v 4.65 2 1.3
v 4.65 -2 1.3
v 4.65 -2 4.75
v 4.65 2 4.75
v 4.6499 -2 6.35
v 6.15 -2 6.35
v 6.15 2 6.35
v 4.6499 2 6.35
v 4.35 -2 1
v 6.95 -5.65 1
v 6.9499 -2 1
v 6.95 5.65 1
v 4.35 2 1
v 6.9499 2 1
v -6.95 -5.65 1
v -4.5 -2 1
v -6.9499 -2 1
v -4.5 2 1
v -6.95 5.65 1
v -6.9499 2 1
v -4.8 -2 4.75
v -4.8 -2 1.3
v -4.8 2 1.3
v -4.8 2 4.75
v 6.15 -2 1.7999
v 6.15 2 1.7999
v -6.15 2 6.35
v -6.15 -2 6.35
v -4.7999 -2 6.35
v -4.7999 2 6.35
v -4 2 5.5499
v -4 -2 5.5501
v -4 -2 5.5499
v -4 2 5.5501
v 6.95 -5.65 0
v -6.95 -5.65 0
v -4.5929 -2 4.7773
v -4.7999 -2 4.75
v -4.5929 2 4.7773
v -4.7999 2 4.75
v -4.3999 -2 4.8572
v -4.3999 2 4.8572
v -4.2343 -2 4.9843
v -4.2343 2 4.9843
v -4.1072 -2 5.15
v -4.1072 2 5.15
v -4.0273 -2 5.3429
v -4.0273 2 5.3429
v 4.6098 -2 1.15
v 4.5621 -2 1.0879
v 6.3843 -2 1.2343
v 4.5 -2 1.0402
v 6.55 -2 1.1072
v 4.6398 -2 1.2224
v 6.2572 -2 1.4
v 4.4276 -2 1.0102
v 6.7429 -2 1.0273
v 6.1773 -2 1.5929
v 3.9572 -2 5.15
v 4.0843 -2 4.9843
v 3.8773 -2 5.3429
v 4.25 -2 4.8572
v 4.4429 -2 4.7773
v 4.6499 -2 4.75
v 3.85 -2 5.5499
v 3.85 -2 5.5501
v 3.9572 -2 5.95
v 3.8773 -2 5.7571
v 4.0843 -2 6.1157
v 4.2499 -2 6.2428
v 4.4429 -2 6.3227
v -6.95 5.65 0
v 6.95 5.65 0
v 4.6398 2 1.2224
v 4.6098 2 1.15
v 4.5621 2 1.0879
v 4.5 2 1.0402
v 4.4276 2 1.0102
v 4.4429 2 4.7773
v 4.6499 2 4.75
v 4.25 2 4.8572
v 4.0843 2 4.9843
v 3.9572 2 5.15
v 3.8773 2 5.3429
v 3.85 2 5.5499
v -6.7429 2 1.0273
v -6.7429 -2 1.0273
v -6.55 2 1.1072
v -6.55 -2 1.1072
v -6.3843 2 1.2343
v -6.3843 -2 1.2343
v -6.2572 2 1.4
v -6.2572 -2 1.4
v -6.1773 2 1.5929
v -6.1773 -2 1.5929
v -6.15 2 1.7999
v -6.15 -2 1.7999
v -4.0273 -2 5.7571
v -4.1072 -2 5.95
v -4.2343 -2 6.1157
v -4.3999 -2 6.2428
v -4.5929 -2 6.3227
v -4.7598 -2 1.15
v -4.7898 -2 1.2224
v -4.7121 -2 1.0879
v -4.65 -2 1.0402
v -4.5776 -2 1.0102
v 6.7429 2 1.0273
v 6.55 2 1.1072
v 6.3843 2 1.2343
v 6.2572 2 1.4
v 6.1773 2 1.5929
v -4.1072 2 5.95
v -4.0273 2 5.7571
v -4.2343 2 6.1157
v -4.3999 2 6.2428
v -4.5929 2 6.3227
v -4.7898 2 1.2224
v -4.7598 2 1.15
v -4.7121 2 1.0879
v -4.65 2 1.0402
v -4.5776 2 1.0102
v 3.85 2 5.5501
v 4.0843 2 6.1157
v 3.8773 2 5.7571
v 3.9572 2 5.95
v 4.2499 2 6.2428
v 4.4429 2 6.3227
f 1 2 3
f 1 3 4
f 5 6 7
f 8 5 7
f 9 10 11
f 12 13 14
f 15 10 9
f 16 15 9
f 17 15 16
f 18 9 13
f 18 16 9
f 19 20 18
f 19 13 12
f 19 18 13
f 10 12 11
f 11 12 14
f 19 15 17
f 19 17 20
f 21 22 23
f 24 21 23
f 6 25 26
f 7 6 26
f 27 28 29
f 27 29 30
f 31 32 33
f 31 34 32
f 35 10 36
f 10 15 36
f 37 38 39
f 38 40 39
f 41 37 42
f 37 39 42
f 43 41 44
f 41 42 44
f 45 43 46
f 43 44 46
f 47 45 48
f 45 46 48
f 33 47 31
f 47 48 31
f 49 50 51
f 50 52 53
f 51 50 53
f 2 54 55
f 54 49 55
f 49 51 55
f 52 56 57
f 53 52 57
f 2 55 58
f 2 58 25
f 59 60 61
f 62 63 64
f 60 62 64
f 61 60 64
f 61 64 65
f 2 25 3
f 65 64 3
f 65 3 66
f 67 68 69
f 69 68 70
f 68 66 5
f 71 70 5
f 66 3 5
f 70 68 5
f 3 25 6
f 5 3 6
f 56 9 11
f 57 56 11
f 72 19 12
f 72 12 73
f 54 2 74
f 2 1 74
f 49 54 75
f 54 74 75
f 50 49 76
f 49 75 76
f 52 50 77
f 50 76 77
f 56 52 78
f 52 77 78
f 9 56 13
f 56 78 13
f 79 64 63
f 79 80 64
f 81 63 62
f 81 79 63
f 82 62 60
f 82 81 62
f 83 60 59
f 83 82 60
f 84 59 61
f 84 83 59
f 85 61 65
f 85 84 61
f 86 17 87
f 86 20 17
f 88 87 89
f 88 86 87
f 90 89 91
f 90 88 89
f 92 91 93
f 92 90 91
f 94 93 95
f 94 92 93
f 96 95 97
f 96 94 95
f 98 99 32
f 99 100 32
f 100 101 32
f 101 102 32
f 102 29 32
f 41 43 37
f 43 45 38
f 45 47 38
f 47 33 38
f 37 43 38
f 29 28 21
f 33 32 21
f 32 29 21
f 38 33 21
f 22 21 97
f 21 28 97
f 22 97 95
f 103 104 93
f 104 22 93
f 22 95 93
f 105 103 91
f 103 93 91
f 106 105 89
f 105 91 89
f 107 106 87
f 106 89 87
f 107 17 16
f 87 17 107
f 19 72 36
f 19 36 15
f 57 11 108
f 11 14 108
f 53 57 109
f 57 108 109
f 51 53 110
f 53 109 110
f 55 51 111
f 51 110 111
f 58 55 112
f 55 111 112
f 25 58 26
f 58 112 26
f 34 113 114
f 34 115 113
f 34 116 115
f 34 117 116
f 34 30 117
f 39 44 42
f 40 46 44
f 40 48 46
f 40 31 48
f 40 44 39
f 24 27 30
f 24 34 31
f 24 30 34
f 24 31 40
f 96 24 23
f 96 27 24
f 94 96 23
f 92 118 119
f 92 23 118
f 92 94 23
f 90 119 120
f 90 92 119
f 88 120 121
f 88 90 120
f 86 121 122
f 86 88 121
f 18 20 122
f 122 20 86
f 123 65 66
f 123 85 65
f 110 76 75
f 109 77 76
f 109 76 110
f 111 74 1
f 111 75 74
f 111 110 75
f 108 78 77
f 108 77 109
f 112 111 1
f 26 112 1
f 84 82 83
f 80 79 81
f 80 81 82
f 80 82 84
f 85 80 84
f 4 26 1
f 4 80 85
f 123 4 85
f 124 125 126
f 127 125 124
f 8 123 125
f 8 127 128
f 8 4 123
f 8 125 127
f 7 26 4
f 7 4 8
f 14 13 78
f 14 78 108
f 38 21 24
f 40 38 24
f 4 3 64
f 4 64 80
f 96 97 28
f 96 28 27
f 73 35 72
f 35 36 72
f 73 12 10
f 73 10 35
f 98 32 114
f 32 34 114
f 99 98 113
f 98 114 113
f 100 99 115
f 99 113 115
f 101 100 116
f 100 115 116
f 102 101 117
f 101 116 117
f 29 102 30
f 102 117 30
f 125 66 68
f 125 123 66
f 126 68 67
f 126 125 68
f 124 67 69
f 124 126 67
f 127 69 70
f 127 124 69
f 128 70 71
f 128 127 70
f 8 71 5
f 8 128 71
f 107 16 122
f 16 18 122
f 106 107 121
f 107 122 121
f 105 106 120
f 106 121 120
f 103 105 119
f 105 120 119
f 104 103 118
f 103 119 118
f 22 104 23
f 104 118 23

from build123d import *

# Parameters (mm, degrees)
SKETCH_1_W      = 12.3
SKETCH_1_H      = 11.3
EXTRUDE_1_DEPTH = 1
SKETCH_2_W      = 1.35
SKETCH_2_H      = 4
SKETCH_2_W_2    = 1.5
EXTRUDE_2_DEPTH = 5.35
SKETCH_3_W      = 1.6
SKETCH_3_H      = 4
EXTRUDE_3_DEPTH = 0.8
SKETCH_4_W      = 1.6
SKETCH_4_H      = 4
EXTRUDE_4_DEPTH = 0.8
FILLET_1_R      = 0.8
FILLET_2_R      = 0.3
SKETCH_5_W      = 1
SKETCH_5_H      = 11.3
EXTRUDE_5_DEPTH = 0.8
SKETCH_6_W      = 1
SKETCH_6_H      = 11.3
EXTRUDE_6_DEPTH = 0.8
FILLET_3_R      = 0.8


with BuildPart() as part:
    # 스케치1 → 보스-돌출1 (new body)
    with BuildSketch(Plane.XY):
        Rectangle(SKETCH_1_W, SKETCH_1_H)
    extrude(amount=EXTRUDE_1_DEPTH)

    # 스케치2 → 보스-돌출2 (add)
    with BuildSketch(Plane.XY.offset(1)):
        with Locations((-5.475, 0)):
            Rectangle(SKETCH_2_W, SKETCH_2_H)
        with Locations((5.4, 0)):
            Rectangle(SKETCH_2_W_2, SKETCH_2_H)
    extrude(amount=EXTRUDE_2_DEPTH)

    # 스케치3 → 보스-돌출3 (add)
    with BuildSketch(Plane(origin=(-4.8, 0, 0), x_dir=(0, 0, -1), z_dir=(1, 0, 0))):
        with Locations((-5.55, 0)):
            Rectangle(SKETCH_3_W, SKETCH_3_H)
    extrude(amount=EXTRUDE_3_DEPTH)

    # 스케치4 → 보스-돌출4 (add)
    with BuildSketch(Plane.ZY.offset(-4.65)):
        with Locations((5.55, 0)):
            Rectangle(SKETCH_4_W, SKETCH_4_H)
    extrude(amount=EXTRUDE_4_DEPTH)

    # 필렛1
    fillet_1_edges = [part.edges().sort_by_distance(p)[0] for p in [
        (3.85, 0, 6.35),
        (3.85, 0, 4.75),
        (-4, 0, 6.35),
        (-4, 0, 4.75),
    ]]
    fillet(fillet_1_edges, radius=FILLET_1_R - 0.0001)  # a hair under: the kernel refuses the full size

    # 필렛2
    fillet_2_edges = [part.edges().sort_by_distance(p)[0] for p in [
        (-4.8, 0, 1),
        (4.65, 0, 1),
    ]]
    fillet(fillet_2_edges, radius=FILLET_2_R)

    # 스케치5 → 보스-돌출5 (add)
    with BuildSketch(Plane.ZY.offset(6.15)):
        with Locations((0.5, 0)):
            Rectangle(SKETCH_5_W, SKETCH_5_H)
    extrude(amount=EXTRUDE_5_DEPTH)

    # 스케치6 → 보스-돌출6 (add)
    with BuildSketch(Plane(origin=(6.15, 0, 0), x_dir=(0, 0, -1), z_dir=(1, 0, 0))):
        with Locations((-0.5, 0)):
            Rectangle(SKETCH_6_W, SKETCH_6_H)
    extrude(amount=EXTRUDE_6_DEPTH)

    # 필렛3
    fillet_3_edges = [part.edges().sort_by_distance(p)[0] for p in [
        (-6.15, 0, 1),
        (6.15, 0, 1),
    ]]
    fillet(fillet_3_edges, radius=FILLET_3_R - 0.0001)  # a hair under: the kernel refuses the full size


solid = part.part
